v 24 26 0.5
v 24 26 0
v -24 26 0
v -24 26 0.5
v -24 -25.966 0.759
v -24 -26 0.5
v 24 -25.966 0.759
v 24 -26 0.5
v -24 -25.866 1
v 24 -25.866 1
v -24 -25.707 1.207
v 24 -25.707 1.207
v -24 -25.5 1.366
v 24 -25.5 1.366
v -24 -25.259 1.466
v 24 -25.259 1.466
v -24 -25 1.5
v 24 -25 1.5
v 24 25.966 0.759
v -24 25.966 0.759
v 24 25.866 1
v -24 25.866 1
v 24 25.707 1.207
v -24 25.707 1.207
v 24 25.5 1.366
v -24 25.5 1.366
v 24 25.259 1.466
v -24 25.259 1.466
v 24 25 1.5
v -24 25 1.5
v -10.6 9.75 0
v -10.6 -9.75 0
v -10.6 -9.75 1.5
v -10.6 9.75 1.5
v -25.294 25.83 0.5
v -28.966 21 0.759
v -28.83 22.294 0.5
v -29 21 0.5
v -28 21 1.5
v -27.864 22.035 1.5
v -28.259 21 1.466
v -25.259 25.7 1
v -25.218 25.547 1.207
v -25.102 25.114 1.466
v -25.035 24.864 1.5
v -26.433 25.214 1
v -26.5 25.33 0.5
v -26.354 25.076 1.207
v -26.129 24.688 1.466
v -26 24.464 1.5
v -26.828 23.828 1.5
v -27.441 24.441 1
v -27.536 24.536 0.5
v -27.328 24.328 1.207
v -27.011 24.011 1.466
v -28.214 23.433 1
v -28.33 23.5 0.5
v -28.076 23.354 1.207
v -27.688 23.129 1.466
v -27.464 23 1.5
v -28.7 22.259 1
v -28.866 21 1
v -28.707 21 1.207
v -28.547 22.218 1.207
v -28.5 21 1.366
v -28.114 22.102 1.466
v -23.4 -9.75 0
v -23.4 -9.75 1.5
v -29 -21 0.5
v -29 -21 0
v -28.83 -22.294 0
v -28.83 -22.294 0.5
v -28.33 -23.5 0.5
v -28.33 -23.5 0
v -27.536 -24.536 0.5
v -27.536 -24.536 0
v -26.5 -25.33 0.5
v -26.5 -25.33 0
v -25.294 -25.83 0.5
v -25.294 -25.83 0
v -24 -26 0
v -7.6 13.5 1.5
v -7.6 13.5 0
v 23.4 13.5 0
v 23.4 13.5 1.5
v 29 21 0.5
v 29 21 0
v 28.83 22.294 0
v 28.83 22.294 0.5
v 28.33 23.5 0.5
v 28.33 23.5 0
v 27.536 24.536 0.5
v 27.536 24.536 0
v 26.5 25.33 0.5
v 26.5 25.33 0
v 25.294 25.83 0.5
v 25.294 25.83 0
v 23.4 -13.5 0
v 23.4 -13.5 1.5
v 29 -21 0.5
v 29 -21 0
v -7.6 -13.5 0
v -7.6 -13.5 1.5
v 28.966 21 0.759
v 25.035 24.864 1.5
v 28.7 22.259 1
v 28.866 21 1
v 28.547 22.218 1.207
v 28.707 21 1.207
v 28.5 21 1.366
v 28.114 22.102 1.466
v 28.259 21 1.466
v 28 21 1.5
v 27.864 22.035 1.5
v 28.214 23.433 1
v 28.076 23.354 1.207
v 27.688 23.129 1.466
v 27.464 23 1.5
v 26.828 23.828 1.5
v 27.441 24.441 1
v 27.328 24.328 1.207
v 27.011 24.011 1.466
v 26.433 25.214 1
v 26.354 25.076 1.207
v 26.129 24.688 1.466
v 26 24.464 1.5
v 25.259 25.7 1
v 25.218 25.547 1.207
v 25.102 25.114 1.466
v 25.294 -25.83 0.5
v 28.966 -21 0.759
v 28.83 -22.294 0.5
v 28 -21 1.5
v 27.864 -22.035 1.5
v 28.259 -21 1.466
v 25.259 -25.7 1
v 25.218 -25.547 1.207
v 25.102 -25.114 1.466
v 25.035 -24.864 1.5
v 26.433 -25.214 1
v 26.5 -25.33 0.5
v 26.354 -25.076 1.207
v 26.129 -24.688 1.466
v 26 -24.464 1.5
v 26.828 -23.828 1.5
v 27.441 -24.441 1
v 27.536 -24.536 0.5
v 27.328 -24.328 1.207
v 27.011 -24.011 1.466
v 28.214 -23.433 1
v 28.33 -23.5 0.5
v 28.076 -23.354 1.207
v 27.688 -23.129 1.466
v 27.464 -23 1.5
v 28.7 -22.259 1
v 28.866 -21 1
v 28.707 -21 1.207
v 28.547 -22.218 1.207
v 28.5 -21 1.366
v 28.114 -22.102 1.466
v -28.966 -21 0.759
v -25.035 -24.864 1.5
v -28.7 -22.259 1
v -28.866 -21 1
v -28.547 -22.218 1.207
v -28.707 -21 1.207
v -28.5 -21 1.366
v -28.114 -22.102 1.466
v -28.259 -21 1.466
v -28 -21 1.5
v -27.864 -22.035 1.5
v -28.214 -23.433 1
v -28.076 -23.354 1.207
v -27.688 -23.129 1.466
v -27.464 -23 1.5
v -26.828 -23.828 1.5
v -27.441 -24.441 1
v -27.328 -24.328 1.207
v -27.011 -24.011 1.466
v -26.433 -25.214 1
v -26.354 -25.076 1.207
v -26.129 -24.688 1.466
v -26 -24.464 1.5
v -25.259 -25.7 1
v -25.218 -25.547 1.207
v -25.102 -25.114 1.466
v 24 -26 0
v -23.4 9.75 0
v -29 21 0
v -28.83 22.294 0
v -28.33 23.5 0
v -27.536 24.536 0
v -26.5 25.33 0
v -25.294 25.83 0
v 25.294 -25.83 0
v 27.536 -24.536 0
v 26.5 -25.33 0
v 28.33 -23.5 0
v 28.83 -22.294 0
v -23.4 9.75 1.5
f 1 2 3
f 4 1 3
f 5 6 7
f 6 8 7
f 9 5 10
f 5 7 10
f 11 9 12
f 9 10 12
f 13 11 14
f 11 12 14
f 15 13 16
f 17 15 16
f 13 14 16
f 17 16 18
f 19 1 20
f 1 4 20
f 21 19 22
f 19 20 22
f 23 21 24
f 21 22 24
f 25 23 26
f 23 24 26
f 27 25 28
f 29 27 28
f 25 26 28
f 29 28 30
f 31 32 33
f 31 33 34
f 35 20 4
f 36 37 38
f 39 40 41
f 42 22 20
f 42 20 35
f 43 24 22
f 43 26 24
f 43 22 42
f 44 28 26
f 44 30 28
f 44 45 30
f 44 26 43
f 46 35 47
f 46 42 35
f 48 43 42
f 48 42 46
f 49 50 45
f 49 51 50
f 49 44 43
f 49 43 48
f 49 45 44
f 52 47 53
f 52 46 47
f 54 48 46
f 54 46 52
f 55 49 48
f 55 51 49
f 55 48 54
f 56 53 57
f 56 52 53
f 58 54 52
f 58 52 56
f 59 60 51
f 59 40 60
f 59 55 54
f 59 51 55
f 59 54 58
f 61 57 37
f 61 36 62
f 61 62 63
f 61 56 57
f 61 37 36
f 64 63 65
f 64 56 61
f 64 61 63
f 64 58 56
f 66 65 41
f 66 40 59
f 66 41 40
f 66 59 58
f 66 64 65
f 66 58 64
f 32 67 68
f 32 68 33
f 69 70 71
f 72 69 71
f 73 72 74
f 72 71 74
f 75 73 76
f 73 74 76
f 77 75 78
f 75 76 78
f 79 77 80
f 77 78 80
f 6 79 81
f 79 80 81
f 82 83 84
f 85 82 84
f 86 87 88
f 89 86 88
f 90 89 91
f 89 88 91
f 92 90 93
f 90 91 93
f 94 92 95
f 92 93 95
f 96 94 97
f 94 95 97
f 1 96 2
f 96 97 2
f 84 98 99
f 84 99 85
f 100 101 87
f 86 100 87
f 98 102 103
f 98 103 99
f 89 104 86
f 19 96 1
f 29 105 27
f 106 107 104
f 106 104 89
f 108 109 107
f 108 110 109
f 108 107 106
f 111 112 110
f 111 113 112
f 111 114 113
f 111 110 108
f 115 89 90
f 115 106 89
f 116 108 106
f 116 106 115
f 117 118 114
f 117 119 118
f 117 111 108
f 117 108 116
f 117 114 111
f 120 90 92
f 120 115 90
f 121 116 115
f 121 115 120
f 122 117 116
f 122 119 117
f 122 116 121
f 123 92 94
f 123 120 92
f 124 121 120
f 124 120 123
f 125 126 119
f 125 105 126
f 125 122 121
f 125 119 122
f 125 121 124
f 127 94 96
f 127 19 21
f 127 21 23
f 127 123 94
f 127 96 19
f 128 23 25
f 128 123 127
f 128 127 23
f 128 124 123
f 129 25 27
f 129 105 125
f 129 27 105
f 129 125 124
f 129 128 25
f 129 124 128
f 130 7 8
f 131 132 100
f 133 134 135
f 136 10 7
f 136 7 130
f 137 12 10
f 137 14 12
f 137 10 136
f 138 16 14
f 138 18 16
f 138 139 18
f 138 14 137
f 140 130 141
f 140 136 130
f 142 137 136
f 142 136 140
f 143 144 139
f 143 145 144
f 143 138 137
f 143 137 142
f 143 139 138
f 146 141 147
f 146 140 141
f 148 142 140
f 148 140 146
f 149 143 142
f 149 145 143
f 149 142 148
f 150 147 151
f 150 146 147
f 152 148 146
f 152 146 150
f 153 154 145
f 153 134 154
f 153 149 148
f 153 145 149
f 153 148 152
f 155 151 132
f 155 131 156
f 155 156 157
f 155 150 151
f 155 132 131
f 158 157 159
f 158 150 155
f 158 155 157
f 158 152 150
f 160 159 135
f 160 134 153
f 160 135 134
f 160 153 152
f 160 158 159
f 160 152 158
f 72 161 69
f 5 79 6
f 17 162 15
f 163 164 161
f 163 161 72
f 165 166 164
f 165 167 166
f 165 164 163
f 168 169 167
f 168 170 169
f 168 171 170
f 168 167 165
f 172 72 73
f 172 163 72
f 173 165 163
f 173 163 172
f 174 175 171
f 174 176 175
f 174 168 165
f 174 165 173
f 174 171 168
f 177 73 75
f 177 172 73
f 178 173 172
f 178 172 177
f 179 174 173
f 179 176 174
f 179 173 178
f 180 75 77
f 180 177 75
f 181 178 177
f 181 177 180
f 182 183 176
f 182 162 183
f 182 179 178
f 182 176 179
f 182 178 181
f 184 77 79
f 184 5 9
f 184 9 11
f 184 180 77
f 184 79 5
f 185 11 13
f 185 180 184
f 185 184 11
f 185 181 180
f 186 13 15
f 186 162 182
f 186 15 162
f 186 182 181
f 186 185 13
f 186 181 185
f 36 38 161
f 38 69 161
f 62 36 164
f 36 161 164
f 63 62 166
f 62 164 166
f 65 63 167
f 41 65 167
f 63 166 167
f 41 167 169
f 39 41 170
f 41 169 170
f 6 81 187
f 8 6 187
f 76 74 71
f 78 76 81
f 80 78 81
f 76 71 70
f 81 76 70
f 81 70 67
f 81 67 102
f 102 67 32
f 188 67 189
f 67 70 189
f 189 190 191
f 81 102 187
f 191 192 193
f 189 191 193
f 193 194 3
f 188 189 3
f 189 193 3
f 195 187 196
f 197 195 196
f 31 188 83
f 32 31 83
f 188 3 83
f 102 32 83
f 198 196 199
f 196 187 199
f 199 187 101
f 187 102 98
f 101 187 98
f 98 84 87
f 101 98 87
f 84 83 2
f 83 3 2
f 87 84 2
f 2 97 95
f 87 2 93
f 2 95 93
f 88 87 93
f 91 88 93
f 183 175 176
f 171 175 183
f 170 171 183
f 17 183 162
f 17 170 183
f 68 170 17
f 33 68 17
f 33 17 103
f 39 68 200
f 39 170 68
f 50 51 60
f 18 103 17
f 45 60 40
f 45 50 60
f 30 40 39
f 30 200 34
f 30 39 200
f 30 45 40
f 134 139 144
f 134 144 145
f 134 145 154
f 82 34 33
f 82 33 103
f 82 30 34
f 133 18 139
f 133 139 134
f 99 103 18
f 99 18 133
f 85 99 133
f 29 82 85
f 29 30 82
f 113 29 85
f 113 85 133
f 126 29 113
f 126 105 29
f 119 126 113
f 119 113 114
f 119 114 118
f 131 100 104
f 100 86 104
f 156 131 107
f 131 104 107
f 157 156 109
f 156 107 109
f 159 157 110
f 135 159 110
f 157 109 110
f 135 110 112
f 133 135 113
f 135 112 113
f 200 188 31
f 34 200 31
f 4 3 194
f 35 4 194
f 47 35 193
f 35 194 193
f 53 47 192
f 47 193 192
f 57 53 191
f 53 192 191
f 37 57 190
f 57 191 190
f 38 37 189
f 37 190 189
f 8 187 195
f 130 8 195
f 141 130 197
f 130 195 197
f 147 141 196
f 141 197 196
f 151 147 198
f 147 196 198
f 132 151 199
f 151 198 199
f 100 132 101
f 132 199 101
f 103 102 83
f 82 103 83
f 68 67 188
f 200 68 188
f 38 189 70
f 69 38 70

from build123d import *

# Parameters (mm, degrees)
F0_W     = 12.8
F0_H     = 19.5
F0_W_2   = 31
F0_H_2   = 27
F1_DEPTH = 1.5
F2_R     = 1


with BuildPart() as f1:
    # F0 (on Top) → F1 (new body)
    with BuildSketch(Plane.XY):
        with BuildLine():
            Line((-24, -26), (24, -26))
            ThreePointArc((24, -26), (27.535534, -24.535534), (29, -21))
            Line((29, -21), (29, 21))
            ThreePointArc((29, 21), (27.535534, 24.535534), (24, 26))
            Line((24, 26), (-24, 26))
            ThreePointArc((-24, 26), (-27.535534, 24.535534), (-29, 21))
            Line((-29, 21), (-29, -21))
            ThreePointArc((-29, -21), (-27.535534, -24.535534), (-24, -26))
        make_face()
        with Locations((-17, 0)):
            Rectangle(F0_W, F0_H, mode=Mode.SUBTRACT)
        with Locations((7.9, 0)):
            Rectangle(F0_W_2, F0_H_2, mode=Mode.SUBTRACT)
    extrude(amount=F1_DEPTH)

    # F2
    f2_edges = [f1.edges().sort_by_distance(p)[0] for p in [
        (-29, 0, 1.5),
    ]]
    fillet(f2_edges, radius=F2_R)


solid = f1.part
